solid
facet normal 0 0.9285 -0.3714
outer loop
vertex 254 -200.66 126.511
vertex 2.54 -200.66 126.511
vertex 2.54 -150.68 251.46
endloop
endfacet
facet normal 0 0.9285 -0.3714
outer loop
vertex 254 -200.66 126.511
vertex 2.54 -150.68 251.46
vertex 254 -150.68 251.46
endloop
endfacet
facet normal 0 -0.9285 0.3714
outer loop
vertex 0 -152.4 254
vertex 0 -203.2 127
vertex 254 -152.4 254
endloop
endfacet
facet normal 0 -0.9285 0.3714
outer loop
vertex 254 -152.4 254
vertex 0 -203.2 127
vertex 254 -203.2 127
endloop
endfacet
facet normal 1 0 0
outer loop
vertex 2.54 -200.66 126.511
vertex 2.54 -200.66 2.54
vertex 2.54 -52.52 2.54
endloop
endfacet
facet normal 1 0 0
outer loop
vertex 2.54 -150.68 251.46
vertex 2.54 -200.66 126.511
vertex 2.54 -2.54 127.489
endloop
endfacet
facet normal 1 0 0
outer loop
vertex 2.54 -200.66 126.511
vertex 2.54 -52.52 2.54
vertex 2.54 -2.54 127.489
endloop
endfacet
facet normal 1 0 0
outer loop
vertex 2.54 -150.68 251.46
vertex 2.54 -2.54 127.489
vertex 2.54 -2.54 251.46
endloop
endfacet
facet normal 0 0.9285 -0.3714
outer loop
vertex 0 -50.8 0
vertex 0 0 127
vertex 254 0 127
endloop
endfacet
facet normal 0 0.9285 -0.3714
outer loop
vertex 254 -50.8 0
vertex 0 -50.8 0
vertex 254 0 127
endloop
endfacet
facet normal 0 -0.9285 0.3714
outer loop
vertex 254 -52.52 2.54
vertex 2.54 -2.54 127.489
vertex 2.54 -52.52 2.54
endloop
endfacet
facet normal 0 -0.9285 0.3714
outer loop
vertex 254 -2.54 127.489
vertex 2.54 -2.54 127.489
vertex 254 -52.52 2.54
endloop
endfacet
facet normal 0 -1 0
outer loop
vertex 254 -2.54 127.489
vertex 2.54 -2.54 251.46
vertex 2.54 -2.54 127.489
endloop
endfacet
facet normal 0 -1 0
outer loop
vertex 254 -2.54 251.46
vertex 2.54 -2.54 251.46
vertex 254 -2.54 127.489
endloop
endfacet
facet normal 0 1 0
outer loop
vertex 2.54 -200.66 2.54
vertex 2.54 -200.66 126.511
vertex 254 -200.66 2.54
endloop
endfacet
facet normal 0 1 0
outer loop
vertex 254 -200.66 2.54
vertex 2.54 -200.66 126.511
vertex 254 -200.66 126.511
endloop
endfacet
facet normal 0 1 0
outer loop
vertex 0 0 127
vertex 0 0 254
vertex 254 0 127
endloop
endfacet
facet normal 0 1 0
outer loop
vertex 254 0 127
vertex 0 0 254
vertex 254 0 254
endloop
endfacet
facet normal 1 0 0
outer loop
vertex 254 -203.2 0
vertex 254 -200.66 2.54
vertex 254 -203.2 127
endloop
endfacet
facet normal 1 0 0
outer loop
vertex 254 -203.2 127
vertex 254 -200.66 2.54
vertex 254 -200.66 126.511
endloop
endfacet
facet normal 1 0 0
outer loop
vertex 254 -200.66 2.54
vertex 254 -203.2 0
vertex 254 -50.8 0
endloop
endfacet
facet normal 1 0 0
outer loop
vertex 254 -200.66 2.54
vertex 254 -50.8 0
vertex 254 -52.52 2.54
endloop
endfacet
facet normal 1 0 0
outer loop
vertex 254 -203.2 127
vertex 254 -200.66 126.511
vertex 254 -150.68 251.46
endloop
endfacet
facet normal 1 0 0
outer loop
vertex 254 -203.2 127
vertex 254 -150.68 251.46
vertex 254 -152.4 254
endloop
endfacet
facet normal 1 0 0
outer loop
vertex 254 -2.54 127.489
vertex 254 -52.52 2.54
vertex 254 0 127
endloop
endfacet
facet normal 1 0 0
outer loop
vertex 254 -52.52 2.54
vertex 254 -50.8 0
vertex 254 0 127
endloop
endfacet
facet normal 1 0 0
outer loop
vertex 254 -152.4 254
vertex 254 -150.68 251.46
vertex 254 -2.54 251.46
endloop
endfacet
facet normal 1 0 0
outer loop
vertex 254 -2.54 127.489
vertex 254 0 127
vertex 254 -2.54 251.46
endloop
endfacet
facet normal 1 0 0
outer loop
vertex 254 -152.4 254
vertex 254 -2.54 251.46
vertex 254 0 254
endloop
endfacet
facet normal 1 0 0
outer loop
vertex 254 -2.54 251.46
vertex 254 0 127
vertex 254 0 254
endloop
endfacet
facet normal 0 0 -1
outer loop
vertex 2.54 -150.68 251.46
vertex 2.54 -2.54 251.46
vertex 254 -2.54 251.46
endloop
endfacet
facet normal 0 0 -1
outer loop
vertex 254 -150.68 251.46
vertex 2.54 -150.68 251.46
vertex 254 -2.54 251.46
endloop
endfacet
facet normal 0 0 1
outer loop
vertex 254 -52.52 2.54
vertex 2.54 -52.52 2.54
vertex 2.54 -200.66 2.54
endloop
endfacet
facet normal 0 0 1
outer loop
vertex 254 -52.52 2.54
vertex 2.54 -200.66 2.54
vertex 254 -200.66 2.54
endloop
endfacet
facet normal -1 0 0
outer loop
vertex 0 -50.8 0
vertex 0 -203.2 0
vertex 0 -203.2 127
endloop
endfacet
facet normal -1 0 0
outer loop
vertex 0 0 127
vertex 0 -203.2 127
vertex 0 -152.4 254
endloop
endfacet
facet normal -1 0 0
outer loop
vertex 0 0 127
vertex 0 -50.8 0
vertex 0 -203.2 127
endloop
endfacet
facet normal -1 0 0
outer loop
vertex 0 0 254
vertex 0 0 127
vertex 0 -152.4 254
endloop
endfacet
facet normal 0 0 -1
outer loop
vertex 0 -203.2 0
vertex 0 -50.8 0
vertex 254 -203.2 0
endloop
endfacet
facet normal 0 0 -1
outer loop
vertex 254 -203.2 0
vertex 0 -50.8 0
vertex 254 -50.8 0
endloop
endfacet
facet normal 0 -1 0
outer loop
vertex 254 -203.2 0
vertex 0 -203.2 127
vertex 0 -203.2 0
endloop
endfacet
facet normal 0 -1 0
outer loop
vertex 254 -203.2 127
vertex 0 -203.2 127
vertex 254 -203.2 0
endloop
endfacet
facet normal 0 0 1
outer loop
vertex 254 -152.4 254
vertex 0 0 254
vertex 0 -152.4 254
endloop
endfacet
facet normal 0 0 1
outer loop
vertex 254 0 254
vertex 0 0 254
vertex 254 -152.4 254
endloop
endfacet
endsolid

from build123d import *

# Parameters (mm, degrees)
F0_W     = 254
F0_H     = 254
F1_DEPTH = 203.2
F2_SIZE2 = 127
F2_SIZE  = 50.8
F3_T     = -2.54


with BuildPart() as f1:
    # F0 (on Front) → F1 (new body)
    with BuildSketch(Plane.XZ):
        with Locations((127, 127)):
            Rectangle(F0_W, F0_H)
    extrude(amount=F1_DEPTH)

    # F2
    f2_edges = [f1.edges().sort_by_distance(p)[0] for p in [
        (127, -203.2, 254),
        (127, 0, 0),
    ]]
    chamfer(f2_edges, length=F2_SIZE, length2=F2_SIZE2)

    # F3
    f3_openings = [f1.faces().sort_by_distance(p)[0] for p in [
        (254, -101.6, 127),
    ]]
    offset(amount=F3_T, openings=f3_openings)


solid = f1.part
